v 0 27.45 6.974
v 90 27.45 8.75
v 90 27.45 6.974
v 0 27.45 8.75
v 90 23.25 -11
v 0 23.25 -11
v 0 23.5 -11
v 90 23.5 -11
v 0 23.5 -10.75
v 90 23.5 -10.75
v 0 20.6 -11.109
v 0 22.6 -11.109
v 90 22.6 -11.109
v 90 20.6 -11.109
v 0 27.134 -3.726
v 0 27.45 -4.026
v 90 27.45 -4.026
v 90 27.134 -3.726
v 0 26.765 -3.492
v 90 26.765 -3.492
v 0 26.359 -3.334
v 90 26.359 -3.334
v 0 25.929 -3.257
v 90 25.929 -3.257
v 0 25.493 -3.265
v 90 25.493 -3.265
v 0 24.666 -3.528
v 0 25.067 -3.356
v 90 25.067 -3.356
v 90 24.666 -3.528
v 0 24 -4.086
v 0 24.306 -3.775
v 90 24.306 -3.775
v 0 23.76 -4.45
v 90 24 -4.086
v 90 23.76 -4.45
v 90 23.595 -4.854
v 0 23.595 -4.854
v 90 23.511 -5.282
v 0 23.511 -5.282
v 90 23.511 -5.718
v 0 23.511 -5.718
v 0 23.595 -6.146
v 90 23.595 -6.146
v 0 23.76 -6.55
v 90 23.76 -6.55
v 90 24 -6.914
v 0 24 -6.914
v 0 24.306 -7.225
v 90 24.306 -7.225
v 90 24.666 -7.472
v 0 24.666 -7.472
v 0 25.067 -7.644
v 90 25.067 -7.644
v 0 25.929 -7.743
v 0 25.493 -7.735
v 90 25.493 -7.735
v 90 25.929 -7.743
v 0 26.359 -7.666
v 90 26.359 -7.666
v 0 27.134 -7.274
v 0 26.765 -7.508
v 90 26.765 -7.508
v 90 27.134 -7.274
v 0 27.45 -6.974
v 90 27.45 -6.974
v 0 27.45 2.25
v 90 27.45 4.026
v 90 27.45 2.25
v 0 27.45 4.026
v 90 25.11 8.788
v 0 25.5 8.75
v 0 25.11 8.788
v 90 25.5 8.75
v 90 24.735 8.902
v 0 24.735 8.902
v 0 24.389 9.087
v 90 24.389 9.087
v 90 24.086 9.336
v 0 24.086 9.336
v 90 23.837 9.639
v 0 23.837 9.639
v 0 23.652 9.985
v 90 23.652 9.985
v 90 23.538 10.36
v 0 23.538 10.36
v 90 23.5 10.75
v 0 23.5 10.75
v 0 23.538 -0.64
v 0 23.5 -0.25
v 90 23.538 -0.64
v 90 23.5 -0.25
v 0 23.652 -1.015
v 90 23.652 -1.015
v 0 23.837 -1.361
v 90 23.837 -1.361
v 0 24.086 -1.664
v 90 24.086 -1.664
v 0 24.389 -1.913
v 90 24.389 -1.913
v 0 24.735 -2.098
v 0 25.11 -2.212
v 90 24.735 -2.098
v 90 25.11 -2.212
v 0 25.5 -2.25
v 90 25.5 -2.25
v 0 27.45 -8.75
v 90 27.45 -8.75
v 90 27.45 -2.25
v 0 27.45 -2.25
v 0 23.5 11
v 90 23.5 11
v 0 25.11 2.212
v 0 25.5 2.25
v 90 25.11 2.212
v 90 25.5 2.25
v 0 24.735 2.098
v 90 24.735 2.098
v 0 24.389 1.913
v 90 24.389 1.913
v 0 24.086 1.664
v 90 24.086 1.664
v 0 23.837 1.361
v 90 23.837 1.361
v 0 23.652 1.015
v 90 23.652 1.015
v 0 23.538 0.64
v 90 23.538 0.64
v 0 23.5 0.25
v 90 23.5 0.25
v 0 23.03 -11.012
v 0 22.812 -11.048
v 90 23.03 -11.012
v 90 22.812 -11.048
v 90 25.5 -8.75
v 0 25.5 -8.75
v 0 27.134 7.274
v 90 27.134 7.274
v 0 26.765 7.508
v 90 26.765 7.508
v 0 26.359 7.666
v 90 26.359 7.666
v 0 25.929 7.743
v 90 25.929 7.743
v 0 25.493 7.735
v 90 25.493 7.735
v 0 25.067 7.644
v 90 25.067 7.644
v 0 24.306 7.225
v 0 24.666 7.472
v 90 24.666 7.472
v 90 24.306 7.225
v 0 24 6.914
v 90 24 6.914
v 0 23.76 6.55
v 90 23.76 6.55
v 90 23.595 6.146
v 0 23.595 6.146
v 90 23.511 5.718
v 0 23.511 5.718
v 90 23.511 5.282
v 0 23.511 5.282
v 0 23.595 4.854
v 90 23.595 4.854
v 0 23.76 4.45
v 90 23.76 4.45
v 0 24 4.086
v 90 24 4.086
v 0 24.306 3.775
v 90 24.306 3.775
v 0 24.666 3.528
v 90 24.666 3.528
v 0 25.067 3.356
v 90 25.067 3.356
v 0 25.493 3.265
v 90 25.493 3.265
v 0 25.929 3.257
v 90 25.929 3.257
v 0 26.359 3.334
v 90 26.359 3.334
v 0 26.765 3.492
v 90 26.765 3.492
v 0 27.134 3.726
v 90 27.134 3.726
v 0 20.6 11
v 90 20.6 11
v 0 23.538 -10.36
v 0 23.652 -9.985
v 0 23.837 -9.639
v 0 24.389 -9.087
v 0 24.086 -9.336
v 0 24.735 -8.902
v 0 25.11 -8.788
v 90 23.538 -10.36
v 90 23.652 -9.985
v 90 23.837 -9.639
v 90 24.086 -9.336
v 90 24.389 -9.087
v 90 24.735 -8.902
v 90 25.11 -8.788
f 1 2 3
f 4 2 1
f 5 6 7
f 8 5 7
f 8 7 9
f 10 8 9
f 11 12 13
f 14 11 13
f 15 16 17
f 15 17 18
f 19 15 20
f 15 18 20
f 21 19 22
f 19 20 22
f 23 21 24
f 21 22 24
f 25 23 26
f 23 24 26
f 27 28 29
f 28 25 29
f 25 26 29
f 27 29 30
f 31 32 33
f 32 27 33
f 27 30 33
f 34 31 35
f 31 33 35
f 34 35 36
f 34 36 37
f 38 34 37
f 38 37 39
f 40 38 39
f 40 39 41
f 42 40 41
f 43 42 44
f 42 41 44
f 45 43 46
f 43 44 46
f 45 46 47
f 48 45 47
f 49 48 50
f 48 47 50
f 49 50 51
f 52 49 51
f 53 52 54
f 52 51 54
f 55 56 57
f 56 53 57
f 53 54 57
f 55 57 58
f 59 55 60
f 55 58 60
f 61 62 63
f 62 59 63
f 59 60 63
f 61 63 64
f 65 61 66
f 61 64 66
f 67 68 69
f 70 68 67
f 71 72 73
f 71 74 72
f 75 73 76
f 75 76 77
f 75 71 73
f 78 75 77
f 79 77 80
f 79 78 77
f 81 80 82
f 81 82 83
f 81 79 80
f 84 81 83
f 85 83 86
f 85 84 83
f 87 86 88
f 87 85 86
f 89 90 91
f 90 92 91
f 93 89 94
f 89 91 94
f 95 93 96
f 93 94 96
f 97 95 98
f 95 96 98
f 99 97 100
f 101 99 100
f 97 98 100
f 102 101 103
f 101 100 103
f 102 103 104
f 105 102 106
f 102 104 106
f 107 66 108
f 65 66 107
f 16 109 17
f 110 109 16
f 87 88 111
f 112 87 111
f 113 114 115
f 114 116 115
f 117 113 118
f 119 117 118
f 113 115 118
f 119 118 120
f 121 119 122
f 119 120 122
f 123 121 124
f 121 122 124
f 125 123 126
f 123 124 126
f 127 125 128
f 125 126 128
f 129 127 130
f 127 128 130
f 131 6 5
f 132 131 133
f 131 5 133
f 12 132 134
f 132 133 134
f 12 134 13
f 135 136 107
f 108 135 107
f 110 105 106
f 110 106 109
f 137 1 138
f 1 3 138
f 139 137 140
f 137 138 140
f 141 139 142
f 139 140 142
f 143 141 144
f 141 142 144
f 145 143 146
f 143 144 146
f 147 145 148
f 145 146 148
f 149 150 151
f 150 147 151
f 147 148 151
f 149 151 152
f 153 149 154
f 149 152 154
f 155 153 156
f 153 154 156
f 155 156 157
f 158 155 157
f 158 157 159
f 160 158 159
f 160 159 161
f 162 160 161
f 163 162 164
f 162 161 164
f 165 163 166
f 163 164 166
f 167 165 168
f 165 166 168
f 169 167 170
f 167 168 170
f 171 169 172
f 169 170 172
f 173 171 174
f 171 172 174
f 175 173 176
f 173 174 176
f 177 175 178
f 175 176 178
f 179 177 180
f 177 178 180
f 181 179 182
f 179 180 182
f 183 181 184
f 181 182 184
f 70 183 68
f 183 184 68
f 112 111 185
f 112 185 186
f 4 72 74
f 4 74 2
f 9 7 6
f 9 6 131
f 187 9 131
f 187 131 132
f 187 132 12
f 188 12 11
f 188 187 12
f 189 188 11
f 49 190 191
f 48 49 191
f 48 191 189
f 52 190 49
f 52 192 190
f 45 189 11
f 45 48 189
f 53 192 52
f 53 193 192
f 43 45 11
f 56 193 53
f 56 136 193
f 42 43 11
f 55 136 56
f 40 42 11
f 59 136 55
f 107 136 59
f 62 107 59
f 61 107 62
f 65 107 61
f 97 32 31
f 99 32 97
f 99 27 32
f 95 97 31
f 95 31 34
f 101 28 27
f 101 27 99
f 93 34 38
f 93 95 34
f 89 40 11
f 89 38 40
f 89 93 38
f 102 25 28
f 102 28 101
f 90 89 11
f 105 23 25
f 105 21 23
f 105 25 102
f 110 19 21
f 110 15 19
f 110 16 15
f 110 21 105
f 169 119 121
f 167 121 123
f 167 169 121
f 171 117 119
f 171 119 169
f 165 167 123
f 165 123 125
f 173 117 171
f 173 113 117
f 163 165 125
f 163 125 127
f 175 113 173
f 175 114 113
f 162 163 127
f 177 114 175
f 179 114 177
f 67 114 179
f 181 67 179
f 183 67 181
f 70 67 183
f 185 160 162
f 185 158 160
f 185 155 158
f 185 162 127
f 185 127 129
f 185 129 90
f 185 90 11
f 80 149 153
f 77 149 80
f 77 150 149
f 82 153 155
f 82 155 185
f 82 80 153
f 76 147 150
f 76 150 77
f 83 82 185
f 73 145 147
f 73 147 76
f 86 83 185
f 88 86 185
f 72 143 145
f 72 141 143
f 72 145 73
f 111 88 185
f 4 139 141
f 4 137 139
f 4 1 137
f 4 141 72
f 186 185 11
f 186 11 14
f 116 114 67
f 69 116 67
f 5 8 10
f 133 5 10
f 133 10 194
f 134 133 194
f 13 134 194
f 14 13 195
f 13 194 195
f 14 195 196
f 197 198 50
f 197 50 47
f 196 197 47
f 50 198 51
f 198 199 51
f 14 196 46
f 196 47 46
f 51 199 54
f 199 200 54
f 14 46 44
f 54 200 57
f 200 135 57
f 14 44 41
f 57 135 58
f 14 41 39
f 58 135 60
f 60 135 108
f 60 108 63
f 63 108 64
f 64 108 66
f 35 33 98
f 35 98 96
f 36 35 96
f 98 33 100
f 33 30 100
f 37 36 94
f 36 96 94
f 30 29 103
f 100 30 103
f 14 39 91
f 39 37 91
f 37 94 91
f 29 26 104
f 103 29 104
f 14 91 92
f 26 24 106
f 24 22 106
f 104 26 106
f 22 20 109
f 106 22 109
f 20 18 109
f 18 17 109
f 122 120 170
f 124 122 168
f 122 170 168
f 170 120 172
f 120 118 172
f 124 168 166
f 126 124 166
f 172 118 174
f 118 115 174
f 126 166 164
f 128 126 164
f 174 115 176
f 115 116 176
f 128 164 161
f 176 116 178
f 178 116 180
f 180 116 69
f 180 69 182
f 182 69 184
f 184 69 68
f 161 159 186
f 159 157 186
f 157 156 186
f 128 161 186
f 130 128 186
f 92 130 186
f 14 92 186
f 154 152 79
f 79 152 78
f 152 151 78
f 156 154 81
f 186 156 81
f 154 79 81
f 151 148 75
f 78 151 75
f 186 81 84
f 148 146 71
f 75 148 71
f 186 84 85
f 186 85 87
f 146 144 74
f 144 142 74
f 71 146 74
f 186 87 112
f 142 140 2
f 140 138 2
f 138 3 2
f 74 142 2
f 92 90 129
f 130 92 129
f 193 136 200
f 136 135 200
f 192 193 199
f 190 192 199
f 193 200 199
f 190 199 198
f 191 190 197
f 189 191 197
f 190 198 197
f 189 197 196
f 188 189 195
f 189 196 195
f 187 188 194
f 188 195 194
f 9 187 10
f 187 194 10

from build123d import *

# Parameters (mm, degrees)
EXTRUDE_1_DEPTH             = 90
SKETCH_2_W                  = 90
SKETCH_2_H                  = 17.75
EXTRUDE_2_DEPTH             = 8.2
SKETCH_3_W                  = 90
SKETCH_3_H                  = 50.95
EXTRUDE_3_DEPTH             = 8.2
SKETCH_4_W                  = 3.95
SKETCH_4_H                  = 29.5
CUT_EXTRUDE_1_DEPTH         = 96.44153315
SKETCH_5_W                  = 3.95
SKETCH_5_H                  = 6.2
CUT_EXTRUDE_2_DEPTH         = 96.44153315
SKETCH_6_W                  = 2.25
SKETCH_6_H                  = 3.95
CUT_EXTRUDE_3_DEPTH         = 96.44153315
SKETCH_7_W                  = 4.5
SKETCH_7_H                  = 3.95
CUT_EXTRUDE_4_DEPTH         = 96.44153315
SKETCH_8_W                  = 2.25
SKETCH_8_H                  = 3.95
CUT_EXTRUDE_5_DEPTH         = 96.44153315
SKETCH_9_W                  = 3.95
SKETCH_9_H                  = 2.25
CUT_EXTRUDE_6_DEPTH         = 96.44153315
SKETCH_10_W                 = 20.2
SKETCH_10_H                 = 45.2
CUT_EXTRUDE_7_DEPTH         = 86
HOLE_WIZARD_2_5_2_5_1_D     = 2.5
HOLE_WIZARD_4_5_4_5_1_D     = 4.5
HOLE_WIZARD_8_3_8_3_1_D     = 8.3
HOLE_WIZARD_8_3_8_3_1_DEPTH = 3.2
FILLET_1_R                  = 2
FILLET_2_R                  = 2
EXTRUDE_START               = -90
SKETCH_17_R                 = 1.25
EXTRUDE_4_DEPTH             = 90
CUT_EXTRUDE_START           = -100
SKETCH_18_R                 = 4.15
CUT_EXTRUDE_8_DEPTH         = 100
CUT_EXTRUDE_9_DEPTH         = 130
SKETCH_20_W                 = 90
SKETCH_20_H                 = 22.108571968
EXTRUDE_5_DEPTH             = 2


with BuildPart() as part:
    # Эскиз1 → Бобышка-Вытянуть1 (new body)
    with BuildSketch(Plane(origin=(90, 0, 0), x_dir=(0, 0, -1), z_dir=(1, 0, 0))):
        with BuildLine():
            Line((6.75, -24.093761792), (6.75, 19.25))
            Line((6.75, 19.25), (-11.593761792, 19.25))
            ThreePointArc((-11.593761792, 19.25), (-15.325, 18), (-11.593761792, 16.75))
            Line((-11.593761792, 16.75), (-11, 16.75))
            Line((-11, 16.75), (-11, -16.75))
            Line((-11, -16.75), (-11.593761792, -16.75))
            ThreePointArc((-11.593761792, -16.75), (-15.325, -18), (-11.593761792, -19.25))
            Line((-11.593761792, -19.25), (-11, -19.25))
            Line((-11, -19.25), (-11, -23.5))
            Line((-11, -23.5), (-6.75, -23.5))
            Line((-6.75, -23.5), (-6.75, -24.093761792))
            ThreePointArc((-6.75, -24.093761792), (-5.5, -27.825), (-4.25, -24.093761792))
            Line((-4.25, -24.093761792), (-4.25, -23.5))
            Line((-4.25, -23.5), (4.25, -23.5))
            Line((4.25, -23.5), (4.25, -24.093761792))
            ThreePointArc((4.25, -24.093761792), (5.5, -27.825), (6.75, -24.093761792))
        make_face()
    extrude(amount=-EXTRUDE_1_DEPTH)

    # Эскиз2 → Бобышка-Вытянуть2 (add)
    with BuildSketch(Plane(origin=(0, 19.25, 0), x_dir=(-1, 0, 0), z_dir=(0, 1, 0))):
        with Locations((-45, 2.125)):
            Rectangle(SKETCH_2_W, SKETCH_2_H)
    extrude(amount=EXTRUDE_2_DEPTH)

    # Эскиз3 → Бобышка-Вытянуть3 (add)
    with BuildSketch(Plane(origin=(0, 0, -6.75), x_dir=(-1, 0, 0), z_dir=(0, 0, -1))):
        with Locations((-45, 1.975)):
            Rectangle(SKETCH_3_W, SKETCH_3_H)
    extrude(amount=EXTRUDE_3_DEPTH)

    # Эскиз4 → Вырез-Вытянуть1 (cut, through all)
    with BuildSketch(Plane.ZY):
        with Locations((-12.975, 0)):
            Rectangle(SKETCH_4_W, SKETCH_4_H)
    extrude(amount=-CUT_EXTRUDE_1_DEPTH, mode=Mode.SUBTRACT)

    # Эскиз5 → Вырез-Вытянуть2 (cut, through all)
    with BuildSketch(Plane.ZY):
        with Locations((-12.975, 24.35)):
            Rectangle(SKETCH_5_W, SKETCH_5_H)
    extrude(amount=-CUT_EXTRUDE_2_DEPTH, mode=Mode.SUBTRACT)

    # Эскиз6 → Вырез-Вытянуть3 (cut, through all)
    with BuildSketch(Plane.ZY):
        with Locations((-9.875, 25.475)):
            Rectangle(SKETCH_6_W, SKETCH_6_H)
    extrude(amount=-CUT_EXTRUDE_3_DEPTH, mode=Mode.SUBTRACT)

    # Эскиз7 → Вырез-Вытянуть4 (cut, through all)
    with BuildSketch(Plane.ZY):
        with Locations((0, 25.475)):
            Rectangle(SKETCH_7_W, SKETCH_7_H)
    extrude(amount=-CUT_EXTRUDE_4_DEPTH, mode=Mode.SUBTRACT)

    # Эскиз8 → Вырез-Вытянуть5 (cut, through all)
    with BuildSketch(Plane.ZY):
        with Locations((9.875, 25.475)):
            Rectangle(SKETCH_8_W, SKETCH_8_H)
    extrude(amount=-CUT_EXTRUDE_5_DEPTH, mode=Mode.SUBTRACT)

    # Эскиз9 → Вырез-Вытянуть6 (cut, through all)
    with BuildSketch(Plane.ZY):
        with Locations((-12.975, -22.375)):
            Rectangle(SKETCH_9_W, SKETCH_9_H)
    extrude(amount=-CUT_EXTRUDE_6_DEPTH, mode=Mode.SUBTRACT)

    # Эскиз10 → Вырез-Вытянуть7 (cut)
    with BuildSketch(Plane(origin=(90, 0, 0), x_dir=(0, 0, -1), z_dir=(1, 0, 0))):
        Rectangle(SKETCH_10_W, SKETCH_10_H)
    extrude(amount=-CUT_EXTRUDE_7_DEPTH, mode=Mode.SUBTRACT)

    # Диаметр отверстия Ø2.5 (2.5)1 (through all)
    with Locations(Plane(origin=(90, 0, 0), x_dir=(0, 0, -1), z_dir=(1, 0, 0))):
        with Locations((5.5, -25.75), (-13.25, -18), (-5.5, -25.75), (-13.25, 18)):
            Hole(HOLE_WIZARD_2_5_2_5_1_D / 2)

    # Диаметр отверстия Ø4.5 (4.5)1 (through all)
    with Locations(Plane.ZY):
        with Locations((-13.25, -18), (-13.25, 18), (-5.5, 25.75), (5.5, 25.75)):
            Hole(HOLE_WIZARD_4_5_4_5_1_D / 2)

    # Диаметр отверстия Ø8.3 (8.3)1
    with Locations(Plane.ZY):
        with Locations((0, 0)):
            Hole(HOLE_WIZARD_8_3_8_3_1_D / 2, depth=HOLE_WIZARD_8_3_8_3_1_DEPTH)

    # Скругление1
    fillet_1_edges = [part.edges().sort_by_distance(p)[0] for p in [
        (45, 23.5, 8.75),
    ]]
    fillet(fillet_1_edges, radius=FILLET_1_R)

    # Скругление2
    fillet_2_edges = [part.edges().sort_by_distance(p)[0] for p in [
        (45, 23.5, -8.75),
        (45, 23.5, 2.25),
        (45, 23.5, -2.25),
        (45, -21.25, -11),
        (4, 0, -10.1),
        (4, -22.6, 0),
        (4, 0, 10.1),
        (4, 22.6, 0),
        (45, 14.75, -11),
        (45, -14.75, -11),
        (45, 21.25, -11),
    ]]
    fillet(fillet_2_edges, radius=FILLET_2_R)

    # Эскиз17 → Бобышка-Вытянуть4 (add)
    with BuildSketch(Plane(origin=(90, 0, 0), x_dir=(0, 0, -1), z_dir=(1, 0, 0)).offset(EXTRUDE_START)):
        with Locations((5.5, -25.75)):
            Circle(SKETCH_17_R)
        with Locations((-5.5, -25.75)):
            Circle(SKETCH_17_R)
        with Locations((-13.25, -18)):
            Circle(SKETCH_17_R)
        with Locations((-13.25, 18)):
            Circle(SKETCH_17_R)
    extrude(amount=EXTRUDE_4_DEPTH)

    # Эскиз18 → Вырез-Вытянуть8 (cut)
    with BuildSketch(Plane.ZY.offset(CUT_EXTRUDE_START)):
        Circle(SKETCH_18_R)
    extrude(amount=CUT_EXTRUDE_8_DEPTH, mode=Mode.SUBTRACT)

    # Эскиз19 → Вырез-Вытянуть9 (cut)
    with BuildSketch(Plane(origin=(90, 0, 0), x_dir=(0, 0, -1), z_dir=(1, 0, 0))):
        Polygon((10.1, 22.6), (-10.1, 22.6), (-23.41122638, 22.6), (-23.41122638, -34.175581762), (22.796675715, -34.175581762), (22.796675715, 22.6), align=None)
    extrude(amount=-CUT_EXTRUDE_9_DEPTH, mode=Mode.SUBTRACT)

    # Эскиз20 → Бобышка-Вытянуть5 (add)
    with BuildSketch(Plane.XZ.offset(-22.6)):
        with Locations((45, -0.054285984)):
            Rectangle(SKETCH_20_W, SKETCH_20_H)
    extrude(amount=EXTRUDE_5_DEPTH)


solid = part.part
